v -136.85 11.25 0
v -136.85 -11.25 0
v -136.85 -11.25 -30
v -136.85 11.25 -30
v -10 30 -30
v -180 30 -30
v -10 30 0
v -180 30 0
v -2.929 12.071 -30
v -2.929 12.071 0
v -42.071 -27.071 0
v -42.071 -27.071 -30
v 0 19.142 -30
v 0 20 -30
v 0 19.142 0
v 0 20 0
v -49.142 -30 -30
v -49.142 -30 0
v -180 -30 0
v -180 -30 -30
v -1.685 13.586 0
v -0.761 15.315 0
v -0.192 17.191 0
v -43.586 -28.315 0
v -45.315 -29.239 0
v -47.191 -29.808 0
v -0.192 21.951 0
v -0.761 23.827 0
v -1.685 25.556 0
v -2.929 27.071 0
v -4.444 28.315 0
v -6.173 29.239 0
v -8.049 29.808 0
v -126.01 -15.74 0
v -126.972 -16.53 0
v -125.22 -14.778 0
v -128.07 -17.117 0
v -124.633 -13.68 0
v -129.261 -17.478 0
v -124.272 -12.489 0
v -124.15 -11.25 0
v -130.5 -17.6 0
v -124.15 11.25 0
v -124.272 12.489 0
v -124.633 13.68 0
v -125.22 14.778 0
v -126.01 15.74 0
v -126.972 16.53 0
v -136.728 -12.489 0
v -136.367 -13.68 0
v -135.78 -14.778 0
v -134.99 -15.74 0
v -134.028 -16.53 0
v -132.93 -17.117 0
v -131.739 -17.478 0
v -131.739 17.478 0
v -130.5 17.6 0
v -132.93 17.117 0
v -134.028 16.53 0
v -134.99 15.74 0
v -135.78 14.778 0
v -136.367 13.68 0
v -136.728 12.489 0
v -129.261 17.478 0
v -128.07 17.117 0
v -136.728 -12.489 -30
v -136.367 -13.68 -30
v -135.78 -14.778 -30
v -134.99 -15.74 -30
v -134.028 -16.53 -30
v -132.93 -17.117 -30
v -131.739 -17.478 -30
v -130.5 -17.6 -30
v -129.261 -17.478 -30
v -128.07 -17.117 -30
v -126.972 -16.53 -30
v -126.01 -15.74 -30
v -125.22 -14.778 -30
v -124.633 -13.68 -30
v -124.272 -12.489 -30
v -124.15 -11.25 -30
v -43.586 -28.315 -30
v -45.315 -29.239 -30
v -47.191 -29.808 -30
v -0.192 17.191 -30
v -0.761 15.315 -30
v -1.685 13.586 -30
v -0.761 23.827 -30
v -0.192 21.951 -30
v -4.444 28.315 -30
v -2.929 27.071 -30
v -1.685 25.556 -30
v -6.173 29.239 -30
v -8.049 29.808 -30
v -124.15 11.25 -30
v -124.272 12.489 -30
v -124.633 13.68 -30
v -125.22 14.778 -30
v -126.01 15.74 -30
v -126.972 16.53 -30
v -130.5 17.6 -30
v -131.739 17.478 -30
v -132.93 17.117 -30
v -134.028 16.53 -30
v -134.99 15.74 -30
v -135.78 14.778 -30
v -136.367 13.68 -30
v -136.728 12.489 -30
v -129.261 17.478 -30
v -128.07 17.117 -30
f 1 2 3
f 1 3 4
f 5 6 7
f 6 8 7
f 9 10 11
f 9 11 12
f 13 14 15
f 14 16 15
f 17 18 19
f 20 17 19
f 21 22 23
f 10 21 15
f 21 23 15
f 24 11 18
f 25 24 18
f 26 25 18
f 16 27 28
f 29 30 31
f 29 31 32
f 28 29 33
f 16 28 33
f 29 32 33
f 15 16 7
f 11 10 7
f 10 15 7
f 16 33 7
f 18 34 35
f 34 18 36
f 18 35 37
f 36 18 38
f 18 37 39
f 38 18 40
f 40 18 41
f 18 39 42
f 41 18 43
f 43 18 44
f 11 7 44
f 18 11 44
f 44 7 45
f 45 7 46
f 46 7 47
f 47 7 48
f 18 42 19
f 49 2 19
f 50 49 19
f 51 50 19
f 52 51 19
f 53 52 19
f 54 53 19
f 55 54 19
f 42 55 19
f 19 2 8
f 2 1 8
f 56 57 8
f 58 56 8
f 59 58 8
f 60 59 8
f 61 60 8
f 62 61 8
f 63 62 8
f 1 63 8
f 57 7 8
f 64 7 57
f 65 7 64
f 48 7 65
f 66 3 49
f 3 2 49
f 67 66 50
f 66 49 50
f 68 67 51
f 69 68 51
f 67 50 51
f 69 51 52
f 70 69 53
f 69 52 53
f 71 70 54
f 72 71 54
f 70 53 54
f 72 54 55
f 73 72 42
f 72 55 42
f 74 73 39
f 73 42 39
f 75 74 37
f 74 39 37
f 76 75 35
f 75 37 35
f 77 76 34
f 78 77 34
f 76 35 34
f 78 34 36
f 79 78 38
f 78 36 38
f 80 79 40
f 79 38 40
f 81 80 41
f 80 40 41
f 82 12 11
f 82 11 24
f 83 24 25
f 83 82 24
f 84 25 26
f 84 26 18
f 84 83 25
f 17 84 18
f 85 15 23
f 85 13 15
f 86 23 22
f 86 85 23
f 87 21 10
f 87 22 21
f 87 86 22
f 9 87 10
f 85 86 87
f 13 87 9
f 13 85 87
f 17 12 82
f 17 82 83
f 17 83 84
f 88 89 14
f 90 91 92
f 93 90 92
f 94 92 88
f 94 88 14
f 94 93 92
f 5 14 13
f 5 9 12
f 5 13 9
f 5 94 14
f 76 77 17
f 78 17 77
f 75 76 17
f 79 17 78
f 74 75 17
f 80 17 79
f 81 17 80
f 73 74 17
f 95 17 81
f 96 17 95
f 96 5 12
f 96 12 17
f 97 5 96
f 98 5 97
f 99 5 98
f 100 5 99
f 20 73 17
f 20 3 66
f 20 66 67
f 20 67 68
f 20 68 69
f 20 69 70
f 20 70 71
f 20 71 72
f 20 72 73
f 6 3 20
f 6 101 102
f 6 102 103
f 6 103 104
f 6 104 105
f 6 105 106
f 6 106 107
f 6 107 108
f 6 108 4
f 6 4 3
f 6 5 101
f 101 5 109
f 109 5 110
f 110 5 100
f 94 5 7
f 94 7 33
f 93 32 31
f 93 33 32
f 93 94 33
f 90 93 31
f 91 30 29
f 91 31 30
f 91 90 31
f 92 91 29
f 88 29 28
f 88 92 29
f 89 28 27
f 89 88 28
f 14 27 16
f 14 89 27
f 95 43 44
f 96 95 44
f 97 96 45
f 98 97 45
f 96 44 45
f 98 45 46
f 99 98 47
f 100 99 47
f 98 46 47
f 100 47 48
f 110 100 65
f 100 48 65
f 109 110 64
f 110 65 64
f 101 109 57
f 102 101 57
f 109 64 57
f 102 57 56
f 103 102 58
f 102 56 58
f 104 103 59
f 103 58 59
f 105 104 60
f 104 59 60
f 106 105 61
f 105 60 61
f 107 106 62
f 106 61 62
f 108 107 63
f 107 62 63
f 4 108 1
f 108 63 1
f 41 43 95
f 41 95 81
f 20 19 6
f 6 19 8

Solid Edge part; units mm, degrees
sketch "Sketch1" plane through (0, 0, 0) normal (0, 0, 1) x (1, 0, 0)
  line L0 (0, -30) -> (-180, -30)
  line L1 (-180, -30) -> (-180, 30)
  line L2 (-180, 30) -> (0, 30)
  line L3 (0, 30) -> (0, -30)
extrude "Protrusion1" add sketch "Sketch1" against normal blind 30
sketch "Sketch2" plane through (-90, 0, 0) normal (0, 0, 1) x (1, 0, 0)
  circle A0 centre (-40.5, 11.25) radius 6.35
  circle A1 centre (-40.5, -11.25) radius 6.35
extrude "Recorte_Extrudado_1" cut sketch "Sketch2" against normal blind 30
sketch "Sketch3" plane through (-90, 0, 0) normal (0, 0, 1) x (1, 0, 0)
  line L0 (-34.15, 11.25) -> (-34.15, -11.25)
  line L1 (-34.15, -11.25) -> (-46.85, -11.25)
  line L2 (-46.85, -11.25) -> (-46.85, 11.25)
  line L3 (-46.85, 11.25) -> (-34.15, 11.25)
extrude "Recorte_Extrudado_2" cut sketch "Sketch3" against normal blind 30
chamfer "Chanfro_3" distance 45 angle 45 1 edges at (0, -30, -15)
fillet "Redondo_5" radius 10 2 edges at (0, 30, -15) (0, 15, -15)
fillet "Redondo_6" radius 10 1 edges at (-45, -30, -15)
